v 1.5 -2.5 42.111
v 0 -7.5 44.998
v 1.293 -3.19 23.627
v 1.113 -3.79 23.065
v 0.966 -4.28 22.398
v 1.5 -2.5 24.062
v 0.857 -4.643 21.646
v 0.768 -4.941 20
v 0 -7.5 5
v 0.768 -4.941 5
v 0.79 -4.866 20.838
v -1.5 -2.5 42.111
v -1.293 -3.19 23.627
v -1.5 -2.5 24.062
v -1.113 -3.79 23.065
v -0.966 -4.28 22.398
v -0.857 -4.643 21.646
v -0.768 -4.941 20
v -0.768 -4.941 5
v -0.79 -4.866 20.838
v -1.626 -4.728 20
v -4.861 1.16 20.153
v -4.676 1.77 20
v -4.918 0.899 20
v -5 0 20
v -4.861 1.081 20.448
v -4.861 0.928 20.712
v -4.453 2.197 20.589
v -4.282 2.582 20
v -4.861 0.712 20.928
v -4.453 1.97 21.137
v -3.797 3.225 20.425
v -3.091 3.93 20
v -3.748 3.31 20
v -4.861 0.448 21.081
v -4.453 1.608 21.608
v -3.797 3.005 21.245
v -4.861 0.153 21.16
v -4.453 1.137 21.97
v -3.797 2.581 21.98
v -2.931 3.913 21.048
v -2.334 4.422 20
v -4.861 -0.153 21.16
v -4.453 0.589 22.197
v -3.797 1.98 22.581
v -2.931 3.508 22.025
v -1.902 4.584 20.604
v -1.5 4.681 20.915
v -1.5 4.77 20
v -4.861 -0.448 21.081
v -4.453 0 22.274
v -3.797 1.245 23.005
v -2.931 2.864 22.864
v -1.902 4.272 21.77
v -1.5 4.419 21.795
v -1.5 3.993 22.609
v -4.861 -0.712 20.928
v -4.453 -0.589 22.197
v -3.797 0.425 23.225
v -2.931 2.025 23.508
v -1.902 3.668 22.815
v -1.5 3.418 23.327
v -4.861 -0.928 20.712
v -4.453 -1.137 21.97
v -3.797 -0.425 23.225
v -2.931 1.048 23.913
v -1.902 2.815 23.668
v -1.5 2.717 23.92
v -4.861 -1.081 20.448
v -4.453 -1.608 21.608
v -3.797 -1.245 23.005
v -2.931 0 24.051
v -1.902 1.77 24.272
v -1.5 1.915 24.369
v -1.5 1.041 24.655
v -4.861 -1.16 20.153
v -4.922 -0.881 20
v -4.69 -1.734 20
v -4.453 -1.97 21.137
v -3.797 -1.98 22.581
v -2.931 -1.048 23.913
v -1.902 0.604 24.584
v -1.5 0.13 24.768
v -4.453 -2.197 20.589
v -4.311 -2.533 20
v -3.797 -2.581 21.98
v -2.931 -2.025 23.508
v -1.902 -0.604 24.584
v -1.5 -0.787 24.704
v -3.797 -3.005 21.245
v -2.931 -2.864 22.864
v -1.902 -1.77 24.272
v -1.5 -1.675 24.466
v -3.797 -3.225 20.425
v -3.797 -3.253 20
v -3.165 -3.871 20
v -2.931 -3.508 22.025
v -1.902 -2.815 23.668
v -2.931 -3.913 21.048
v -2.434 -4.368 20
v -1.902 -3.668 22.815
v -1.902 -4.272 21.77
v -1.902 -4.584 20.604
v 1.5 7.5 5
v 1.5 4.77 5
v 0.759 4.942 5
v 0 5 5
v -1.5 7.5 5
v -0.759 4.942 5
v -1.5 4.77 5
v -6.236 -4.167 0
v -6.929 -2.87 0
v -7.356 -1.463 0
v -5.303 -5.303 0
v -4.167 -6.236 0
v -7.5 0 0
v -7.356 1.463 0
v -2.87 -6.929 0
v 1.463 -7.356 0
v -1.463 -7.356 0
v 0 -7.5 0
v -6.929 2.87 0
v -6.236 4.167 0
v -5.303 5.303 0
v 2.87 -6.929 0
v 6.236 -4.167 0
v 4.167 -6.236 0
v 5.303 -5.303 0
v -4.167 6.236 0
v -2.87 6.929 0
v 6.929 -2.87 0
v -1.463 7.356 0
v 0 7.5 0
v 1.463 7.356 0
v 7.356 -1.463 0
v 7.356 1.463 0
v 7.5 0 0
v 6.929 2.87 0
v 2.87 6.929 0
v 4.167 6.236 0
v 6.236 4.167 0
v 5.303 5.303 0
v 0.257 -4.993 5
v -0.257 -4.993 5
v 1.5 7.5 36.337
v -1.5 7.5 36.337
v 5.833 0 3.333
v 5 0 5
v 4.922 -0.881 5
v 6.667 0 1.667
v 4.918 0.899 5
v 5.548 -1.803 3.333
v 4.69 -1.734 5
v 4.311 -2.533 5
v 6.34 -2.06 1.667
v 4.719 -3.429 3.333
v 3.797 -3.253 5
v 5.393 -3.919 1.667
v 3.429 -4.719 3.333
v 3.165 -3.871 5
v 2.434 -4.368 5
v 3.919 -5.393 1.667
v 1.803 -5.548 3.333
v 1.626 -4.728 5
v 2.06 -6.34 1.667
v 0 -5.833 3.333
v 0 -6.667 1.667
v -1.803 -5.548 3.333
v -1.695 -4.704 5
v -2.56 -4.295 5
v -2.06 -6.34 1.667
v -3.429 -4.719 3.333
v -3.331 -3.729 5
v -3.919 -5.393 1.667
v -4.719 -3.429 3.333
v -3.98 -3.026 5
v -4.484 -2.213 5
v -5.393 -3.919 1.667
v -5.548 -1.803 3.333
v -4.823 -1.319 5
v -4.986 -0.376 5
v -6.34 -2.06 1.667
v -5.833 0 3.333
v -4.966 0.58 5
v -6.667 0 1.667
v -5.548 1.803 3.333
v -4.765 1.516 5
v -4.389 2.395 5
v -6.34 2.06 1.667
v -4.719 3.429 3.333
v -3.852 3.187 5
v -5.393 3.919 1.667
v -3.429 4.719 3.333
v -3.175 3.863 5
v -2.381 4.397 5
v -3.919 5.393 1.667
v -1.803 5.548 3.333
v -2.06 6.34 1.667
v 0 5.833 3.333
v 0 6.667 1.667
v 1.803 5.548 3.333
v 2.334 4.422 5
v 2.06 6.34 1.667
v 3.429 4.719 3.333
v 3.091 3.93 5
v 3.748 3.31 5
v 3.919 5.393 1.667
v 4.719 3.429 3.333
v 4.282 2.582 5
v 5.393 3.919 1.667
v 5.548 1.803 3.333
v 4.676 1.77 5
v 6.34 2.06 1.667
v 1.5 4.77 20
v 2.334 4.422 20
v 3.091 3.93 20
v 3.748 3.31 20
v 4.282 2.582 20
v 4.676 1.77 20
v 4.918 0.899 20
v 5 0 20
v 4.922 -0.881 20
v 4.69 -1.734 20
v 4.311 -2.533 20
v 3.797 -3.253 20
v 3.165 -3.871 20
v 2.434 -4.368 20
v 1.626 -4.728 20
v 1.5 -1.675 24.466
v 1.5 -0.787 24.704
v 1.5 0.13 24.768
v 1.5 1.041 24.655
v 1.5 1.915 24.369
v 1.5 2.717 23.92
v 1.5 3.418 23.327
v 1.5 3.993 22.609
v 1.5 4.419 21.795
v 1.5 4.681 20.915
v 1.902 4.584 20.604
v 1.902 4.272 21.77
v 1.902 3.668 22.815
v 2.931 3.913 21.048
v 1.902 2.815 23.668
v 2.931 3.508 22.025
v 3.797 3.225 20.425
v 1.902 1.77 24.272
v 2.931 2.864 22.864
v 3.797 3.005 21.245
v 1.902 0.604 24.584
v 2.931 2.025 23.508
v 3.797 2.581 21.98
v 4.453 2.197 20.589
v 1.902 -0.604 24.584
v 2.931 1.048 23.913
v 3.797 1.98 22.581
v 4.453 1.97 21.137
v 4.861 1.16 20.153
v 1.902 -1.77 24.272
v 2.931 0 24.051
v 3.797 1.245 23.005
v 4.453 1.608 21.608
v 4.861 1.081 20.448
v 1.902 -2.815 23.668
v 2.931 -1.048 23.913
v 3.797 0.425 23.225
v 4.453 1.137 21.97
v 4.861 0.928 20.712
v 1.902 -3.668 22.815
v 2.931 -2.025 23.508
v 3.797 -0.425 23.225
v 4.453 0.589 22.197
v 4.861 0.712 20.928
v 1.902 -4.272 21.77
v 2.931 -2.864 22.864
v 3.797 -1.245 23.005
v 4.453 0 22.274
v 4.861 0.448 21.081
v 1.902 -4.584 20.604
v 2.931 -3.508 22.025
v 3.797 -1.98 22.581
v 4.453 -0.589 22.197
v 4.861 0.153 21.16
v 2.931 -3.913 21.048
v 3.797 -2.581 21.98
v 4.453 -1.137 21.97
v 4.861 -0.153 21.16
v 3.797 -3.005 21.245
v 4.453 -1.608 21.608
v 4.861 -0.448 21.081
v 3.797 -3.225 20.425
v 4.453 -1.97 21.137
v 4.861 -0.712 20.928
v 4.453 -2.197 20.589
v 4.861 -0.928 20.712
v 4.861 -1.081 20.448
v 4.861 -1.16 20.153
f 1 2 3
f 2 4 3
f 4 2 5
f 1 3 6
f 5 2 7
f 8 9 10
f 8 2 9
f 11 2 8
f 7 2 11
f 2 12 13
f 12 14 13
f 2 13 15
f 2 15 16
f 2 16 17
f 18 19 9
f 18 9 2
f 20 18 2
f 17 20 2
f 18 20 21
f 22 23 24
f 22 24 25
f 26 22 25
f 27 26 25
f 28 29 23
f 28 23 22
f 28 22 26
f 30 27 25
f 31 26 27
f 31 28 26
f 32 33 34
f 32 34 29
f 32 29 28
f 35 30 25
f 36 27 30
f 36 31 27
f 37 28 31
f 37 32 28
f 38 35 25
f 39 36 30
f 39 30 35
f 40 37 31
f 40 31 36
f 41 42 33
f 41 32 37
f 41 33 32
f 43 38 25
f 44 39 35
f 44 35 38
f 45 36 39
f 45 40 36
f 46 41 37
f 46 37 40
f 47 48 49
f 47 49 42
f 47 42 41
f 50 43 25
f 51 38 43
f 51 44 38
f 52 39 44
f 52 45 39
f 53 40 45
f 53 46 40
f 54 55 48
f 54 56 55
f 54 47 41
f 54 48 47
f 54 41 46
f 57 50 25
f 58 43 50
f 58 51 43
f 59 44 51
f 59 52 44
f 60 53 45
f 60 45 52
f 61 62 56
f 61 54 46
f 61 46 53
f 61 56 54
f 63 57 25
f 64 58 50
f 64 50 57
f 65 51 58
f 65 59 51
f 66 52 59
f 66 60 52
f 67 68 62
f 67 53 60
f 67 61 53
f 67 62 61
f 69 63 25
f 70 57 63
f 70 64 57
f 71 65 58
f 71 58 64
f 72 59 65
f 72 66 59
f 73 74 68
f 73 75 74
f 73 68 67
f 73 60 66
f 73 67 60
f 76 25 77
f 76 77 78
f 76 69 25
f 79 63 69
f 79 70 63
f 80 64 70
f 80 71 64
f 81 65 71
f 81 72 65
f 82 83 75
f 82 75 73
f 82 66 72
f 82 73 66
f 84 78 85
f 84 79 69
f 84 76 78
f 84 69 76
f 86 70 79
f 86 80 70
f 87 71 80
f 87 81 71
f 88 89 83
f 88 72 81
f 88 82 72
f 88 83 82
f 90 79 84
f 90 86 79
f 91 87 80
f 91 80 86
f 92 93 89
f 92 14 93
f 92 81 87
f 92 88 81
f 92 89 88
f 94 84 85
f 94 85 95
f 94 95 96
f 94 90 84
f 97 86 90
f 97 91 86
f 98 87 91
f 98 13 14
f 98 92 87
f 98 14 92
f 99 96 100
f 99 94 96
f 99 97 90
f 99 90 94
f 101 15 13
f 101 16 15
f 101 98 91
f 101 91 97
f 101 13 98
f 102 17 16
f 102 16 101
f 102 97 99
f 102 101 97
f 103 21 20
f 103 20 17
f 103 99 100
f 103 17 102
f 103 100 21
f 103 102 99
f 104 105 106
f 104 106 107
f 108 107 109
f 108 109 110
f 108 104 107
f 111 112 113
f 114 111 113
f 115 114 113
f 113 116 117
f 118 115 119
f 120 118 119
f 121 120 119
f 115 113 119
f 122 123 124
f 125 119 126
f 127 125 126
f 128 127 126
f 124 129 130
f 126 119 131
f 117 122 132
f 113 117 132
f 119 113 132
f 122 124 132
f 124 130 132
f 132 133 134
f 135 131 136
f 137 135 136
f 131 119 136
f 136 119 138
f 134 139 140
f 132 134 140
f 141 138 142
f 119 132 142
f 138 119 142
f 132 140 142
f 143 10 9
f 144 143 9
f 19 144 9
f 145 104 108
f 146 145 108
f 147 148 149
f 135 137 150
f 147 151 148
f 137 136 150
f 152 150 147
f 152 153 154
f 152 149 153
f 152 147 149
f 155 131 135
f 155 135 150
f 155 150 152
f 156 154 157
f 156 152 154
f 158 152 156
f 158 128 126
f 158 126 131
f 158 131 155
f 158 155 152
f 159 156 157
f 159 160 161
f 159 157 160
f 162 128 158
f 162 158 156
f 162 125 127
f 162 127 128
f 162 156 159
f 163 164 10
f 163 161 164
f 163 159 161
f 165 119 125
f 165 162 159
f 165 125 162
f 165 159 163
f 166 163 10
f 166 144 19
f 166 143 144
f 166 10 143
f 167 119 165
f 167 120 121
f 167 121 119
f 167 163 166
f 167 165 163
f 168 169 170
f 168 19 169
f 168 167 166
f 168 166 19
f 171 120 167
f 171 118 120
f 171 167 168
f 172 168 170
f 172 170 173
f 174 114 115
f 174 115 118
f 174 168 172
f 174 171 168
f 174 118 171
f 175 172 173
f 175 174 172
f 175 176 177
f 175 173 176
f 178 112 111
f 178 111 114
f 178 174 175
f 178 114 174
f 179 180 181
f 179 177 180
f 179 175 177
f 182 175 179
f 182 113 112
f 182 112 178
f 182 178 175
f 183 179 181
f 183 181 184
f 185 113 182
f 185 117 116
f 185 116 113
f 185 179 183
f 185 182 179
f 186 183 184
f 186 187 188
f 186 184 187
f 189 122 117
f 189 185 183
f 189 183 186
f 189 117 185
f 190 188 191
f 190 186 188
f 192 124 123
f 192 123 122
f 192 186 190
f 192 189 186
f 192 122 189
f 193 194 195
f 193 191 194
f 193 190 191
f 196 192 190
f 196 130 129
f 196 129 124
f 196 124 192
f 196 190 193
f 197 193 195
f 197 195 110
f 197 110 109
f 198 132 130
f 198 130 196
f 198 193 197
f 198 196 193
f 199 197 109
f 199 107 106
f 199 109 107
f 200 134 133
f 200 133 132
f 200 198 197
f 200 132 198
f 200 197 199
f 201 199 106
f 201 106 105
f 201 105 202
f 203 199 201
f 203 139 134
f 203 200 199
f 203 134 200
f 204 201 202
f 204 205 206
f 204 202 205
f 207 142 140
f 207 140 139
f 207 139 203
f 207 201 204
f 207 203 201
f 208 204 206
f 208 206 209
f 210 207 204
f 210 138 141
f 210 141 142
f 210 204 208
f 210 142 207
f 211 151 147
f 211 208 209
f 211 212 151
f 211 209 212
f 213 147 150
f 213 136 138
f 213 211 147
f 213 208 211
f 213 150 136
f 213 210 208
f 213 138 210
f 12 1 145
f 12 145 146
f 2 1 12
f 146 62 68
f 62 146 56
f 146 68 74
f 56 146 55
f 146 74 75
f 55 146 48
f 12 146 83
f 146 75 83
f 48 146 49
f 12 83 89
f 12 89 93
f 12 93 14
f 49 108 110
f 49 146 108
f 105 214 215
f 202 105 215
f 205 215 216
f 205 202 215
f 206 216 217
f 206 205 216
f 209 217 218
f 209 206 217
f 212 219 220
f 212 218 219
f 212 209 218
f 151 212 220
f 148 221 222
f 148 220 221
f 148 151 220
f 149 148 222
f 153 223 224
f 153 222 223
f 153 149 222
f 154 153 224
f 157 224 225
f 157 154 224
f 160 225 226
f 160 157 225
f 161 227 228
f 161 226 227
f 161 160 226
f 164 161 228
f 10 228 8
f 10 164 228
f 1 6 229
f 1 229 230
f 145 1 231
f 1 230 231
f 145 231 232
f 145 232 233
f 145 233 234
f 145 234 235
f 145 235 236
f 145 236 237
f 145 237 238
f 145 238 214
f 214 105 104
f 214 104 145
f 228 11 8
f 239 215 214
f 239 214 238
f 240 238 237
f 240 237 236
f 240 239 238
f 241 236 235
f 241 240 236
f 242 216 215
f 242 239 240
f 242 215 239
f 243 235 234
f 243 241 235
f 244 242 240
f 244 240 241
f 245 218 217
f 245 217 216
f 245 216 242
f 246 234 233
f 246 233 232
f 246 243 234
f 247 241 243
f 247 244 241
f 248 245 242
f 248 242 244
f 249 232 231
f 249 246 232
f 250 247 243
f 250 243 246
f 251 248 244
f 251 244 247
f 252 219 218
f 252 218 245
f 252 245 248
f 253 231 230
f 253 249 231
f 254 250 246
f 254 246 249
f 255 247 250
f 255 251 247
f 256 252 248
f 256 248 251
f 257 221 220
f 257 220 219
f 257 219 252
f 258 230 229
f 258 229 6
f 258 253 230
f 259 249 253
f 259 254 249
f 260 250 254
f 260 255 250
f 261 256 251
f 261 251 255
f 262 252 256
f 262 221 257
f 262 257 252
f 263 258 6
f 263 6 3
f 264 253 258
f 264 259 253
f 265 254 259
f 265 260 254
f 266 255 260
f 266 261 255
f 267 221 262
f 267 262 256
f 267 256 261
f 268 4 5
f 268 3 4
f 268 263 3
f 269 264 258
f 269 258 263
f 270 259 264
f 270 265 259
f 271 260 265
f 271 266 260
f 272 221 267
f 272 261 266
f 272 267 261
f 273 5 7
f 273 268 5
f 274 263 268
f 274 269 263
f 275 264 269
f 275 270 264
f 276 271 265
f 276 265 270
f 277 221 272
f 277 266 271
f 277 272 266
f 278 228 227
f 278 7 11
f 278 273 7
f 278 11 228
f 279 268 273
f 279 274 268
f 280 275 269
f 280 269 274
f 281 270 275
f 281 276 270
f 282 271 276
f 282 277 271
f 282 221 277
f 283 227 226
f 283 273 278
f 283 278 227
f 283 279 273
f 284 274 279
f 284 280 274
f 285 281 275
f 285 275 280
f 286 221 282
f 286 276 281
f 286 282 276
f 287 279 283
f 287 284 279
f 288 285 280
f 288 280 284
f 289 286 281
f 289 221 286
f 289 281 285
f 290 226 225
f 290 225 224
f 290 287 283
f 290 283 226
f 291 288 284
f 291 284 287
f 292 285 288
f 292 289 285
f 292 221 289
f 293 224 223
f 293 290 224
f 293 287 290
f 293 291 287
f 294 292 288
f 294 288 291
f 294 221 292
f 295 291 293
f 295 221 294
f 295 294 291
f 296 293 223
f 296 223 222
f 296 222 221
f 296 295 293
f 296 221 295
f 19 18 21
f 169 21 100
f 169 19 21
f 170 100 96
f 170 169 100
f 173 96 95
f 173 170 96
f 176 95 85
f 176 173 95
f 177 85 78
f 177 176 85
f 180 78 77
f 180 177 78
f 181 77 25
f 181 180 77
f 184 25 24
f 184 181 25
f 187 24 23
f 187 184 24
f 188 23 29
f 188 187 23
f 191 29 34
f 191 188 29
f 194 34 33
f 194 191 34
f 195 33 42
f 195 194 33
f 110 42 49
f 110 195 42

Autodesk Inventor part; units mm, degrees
sketch "Sketch1" plane through (0, 0, 0) normal (0, 0, 1) x (1, 0, 0)
  circle A0 centre (0, 0) radius 7.5
  dimension "d0" = 15
ref_plane "Work Plane1" through (0, 0, 5) normal (0, 0, 1) x (1, 0, 0)
sketch "Sketch2" plane through (0, 0, 5) normal (0, 0, 1) x (1, 0, 0)
  circle A0 centre (0, 0) radius 5
  dimension "d4" = 10
loft "Loft1" add profiles "Sketch1", "Sketch2"
sketch "Sketch3" plane through (0, 0, 5) normal (0, 0, 1) x (1, 0, 0)
  circle A0 centre (0, 0) radius 5
  dimension "d9" = 10
extrude "Extrusion2" add sketch "Sketch3" along normal blind 15
sketch "Sketch4" plane through (0, 0, 20) normal (0, 0, 1) x (1, 0, 0)
  line L0 (5, 0) -> (-5, 0)
  arc A0 (-5, 0) -> (5, 0) centre (0, 0) ccw
revolve "Revolution1" add sketch "Sketch4" angle 180 about axis through (5, 0, 20) along (-1, 0, 0)
ref_plane "Work Plane2" through (0, 0, 5) normal (0, 0, -1) x (-1, 0, 0)
sketch "Sketch6" plane through (0, 0, 5) normal (0, 0, -1) x (-1, 0, 0)
  line L0 (-1.5, 7.5) -> (1.5, 7.5)
  line L1 (1.5, -2.5) -> (0, -7.5)
  line L2 (0, -7.5) -> (-1.5, -2.5)
  line L3 (1.5, 7.5) -> (1.5, -2.5)
  line L4 (-1.5, -2.5) -> (-1.5, 7.5)
  line L5 (0.9, -4.5) -> (-1.5, 7.5) construction
  line L6 (-0.9, -4.5) -> (1.5, 7.5) construction
  point P0 (0, 0)
  point P1 (0, 7.5)
  point P2 (0, 0)
  dimension "d14" = 3
extrude "Extrusion3" add sketch "Sketch6" against normal blind 40
ref_plane "Work Plane3" through (1.5, 7.5, 45) normal (0, 0.5, 0.866) x (-1, 0, 0)
sketch "Sketch7" plane through (1.5, 7.5, 45) normal (0, 0.5, 0.866) x (-1, 0, 0)
  line L0 (0, 16.105) -> (3, 16.105)
  line L1 (3, 16.105) -> (3, -7.3572)
  line L2 (3, -7.3572) -> (0, -7.3572)
  line L3 (0, -7.3572) -> (0, 16.105)
  line L4 (0, 16.105) -> (3, -7.3572) construction
  line L5 (3, 16.105) -> (0, -7.3572) construction
  point P0 (1.5, -16.0048)
  point P1 (1.5, 4.3739)
  dimension "d19" = 23.4622
extrude "Extrusion4" cut sketch "Sketch7" against normal blind 7.5
properties part number "Cutter"
